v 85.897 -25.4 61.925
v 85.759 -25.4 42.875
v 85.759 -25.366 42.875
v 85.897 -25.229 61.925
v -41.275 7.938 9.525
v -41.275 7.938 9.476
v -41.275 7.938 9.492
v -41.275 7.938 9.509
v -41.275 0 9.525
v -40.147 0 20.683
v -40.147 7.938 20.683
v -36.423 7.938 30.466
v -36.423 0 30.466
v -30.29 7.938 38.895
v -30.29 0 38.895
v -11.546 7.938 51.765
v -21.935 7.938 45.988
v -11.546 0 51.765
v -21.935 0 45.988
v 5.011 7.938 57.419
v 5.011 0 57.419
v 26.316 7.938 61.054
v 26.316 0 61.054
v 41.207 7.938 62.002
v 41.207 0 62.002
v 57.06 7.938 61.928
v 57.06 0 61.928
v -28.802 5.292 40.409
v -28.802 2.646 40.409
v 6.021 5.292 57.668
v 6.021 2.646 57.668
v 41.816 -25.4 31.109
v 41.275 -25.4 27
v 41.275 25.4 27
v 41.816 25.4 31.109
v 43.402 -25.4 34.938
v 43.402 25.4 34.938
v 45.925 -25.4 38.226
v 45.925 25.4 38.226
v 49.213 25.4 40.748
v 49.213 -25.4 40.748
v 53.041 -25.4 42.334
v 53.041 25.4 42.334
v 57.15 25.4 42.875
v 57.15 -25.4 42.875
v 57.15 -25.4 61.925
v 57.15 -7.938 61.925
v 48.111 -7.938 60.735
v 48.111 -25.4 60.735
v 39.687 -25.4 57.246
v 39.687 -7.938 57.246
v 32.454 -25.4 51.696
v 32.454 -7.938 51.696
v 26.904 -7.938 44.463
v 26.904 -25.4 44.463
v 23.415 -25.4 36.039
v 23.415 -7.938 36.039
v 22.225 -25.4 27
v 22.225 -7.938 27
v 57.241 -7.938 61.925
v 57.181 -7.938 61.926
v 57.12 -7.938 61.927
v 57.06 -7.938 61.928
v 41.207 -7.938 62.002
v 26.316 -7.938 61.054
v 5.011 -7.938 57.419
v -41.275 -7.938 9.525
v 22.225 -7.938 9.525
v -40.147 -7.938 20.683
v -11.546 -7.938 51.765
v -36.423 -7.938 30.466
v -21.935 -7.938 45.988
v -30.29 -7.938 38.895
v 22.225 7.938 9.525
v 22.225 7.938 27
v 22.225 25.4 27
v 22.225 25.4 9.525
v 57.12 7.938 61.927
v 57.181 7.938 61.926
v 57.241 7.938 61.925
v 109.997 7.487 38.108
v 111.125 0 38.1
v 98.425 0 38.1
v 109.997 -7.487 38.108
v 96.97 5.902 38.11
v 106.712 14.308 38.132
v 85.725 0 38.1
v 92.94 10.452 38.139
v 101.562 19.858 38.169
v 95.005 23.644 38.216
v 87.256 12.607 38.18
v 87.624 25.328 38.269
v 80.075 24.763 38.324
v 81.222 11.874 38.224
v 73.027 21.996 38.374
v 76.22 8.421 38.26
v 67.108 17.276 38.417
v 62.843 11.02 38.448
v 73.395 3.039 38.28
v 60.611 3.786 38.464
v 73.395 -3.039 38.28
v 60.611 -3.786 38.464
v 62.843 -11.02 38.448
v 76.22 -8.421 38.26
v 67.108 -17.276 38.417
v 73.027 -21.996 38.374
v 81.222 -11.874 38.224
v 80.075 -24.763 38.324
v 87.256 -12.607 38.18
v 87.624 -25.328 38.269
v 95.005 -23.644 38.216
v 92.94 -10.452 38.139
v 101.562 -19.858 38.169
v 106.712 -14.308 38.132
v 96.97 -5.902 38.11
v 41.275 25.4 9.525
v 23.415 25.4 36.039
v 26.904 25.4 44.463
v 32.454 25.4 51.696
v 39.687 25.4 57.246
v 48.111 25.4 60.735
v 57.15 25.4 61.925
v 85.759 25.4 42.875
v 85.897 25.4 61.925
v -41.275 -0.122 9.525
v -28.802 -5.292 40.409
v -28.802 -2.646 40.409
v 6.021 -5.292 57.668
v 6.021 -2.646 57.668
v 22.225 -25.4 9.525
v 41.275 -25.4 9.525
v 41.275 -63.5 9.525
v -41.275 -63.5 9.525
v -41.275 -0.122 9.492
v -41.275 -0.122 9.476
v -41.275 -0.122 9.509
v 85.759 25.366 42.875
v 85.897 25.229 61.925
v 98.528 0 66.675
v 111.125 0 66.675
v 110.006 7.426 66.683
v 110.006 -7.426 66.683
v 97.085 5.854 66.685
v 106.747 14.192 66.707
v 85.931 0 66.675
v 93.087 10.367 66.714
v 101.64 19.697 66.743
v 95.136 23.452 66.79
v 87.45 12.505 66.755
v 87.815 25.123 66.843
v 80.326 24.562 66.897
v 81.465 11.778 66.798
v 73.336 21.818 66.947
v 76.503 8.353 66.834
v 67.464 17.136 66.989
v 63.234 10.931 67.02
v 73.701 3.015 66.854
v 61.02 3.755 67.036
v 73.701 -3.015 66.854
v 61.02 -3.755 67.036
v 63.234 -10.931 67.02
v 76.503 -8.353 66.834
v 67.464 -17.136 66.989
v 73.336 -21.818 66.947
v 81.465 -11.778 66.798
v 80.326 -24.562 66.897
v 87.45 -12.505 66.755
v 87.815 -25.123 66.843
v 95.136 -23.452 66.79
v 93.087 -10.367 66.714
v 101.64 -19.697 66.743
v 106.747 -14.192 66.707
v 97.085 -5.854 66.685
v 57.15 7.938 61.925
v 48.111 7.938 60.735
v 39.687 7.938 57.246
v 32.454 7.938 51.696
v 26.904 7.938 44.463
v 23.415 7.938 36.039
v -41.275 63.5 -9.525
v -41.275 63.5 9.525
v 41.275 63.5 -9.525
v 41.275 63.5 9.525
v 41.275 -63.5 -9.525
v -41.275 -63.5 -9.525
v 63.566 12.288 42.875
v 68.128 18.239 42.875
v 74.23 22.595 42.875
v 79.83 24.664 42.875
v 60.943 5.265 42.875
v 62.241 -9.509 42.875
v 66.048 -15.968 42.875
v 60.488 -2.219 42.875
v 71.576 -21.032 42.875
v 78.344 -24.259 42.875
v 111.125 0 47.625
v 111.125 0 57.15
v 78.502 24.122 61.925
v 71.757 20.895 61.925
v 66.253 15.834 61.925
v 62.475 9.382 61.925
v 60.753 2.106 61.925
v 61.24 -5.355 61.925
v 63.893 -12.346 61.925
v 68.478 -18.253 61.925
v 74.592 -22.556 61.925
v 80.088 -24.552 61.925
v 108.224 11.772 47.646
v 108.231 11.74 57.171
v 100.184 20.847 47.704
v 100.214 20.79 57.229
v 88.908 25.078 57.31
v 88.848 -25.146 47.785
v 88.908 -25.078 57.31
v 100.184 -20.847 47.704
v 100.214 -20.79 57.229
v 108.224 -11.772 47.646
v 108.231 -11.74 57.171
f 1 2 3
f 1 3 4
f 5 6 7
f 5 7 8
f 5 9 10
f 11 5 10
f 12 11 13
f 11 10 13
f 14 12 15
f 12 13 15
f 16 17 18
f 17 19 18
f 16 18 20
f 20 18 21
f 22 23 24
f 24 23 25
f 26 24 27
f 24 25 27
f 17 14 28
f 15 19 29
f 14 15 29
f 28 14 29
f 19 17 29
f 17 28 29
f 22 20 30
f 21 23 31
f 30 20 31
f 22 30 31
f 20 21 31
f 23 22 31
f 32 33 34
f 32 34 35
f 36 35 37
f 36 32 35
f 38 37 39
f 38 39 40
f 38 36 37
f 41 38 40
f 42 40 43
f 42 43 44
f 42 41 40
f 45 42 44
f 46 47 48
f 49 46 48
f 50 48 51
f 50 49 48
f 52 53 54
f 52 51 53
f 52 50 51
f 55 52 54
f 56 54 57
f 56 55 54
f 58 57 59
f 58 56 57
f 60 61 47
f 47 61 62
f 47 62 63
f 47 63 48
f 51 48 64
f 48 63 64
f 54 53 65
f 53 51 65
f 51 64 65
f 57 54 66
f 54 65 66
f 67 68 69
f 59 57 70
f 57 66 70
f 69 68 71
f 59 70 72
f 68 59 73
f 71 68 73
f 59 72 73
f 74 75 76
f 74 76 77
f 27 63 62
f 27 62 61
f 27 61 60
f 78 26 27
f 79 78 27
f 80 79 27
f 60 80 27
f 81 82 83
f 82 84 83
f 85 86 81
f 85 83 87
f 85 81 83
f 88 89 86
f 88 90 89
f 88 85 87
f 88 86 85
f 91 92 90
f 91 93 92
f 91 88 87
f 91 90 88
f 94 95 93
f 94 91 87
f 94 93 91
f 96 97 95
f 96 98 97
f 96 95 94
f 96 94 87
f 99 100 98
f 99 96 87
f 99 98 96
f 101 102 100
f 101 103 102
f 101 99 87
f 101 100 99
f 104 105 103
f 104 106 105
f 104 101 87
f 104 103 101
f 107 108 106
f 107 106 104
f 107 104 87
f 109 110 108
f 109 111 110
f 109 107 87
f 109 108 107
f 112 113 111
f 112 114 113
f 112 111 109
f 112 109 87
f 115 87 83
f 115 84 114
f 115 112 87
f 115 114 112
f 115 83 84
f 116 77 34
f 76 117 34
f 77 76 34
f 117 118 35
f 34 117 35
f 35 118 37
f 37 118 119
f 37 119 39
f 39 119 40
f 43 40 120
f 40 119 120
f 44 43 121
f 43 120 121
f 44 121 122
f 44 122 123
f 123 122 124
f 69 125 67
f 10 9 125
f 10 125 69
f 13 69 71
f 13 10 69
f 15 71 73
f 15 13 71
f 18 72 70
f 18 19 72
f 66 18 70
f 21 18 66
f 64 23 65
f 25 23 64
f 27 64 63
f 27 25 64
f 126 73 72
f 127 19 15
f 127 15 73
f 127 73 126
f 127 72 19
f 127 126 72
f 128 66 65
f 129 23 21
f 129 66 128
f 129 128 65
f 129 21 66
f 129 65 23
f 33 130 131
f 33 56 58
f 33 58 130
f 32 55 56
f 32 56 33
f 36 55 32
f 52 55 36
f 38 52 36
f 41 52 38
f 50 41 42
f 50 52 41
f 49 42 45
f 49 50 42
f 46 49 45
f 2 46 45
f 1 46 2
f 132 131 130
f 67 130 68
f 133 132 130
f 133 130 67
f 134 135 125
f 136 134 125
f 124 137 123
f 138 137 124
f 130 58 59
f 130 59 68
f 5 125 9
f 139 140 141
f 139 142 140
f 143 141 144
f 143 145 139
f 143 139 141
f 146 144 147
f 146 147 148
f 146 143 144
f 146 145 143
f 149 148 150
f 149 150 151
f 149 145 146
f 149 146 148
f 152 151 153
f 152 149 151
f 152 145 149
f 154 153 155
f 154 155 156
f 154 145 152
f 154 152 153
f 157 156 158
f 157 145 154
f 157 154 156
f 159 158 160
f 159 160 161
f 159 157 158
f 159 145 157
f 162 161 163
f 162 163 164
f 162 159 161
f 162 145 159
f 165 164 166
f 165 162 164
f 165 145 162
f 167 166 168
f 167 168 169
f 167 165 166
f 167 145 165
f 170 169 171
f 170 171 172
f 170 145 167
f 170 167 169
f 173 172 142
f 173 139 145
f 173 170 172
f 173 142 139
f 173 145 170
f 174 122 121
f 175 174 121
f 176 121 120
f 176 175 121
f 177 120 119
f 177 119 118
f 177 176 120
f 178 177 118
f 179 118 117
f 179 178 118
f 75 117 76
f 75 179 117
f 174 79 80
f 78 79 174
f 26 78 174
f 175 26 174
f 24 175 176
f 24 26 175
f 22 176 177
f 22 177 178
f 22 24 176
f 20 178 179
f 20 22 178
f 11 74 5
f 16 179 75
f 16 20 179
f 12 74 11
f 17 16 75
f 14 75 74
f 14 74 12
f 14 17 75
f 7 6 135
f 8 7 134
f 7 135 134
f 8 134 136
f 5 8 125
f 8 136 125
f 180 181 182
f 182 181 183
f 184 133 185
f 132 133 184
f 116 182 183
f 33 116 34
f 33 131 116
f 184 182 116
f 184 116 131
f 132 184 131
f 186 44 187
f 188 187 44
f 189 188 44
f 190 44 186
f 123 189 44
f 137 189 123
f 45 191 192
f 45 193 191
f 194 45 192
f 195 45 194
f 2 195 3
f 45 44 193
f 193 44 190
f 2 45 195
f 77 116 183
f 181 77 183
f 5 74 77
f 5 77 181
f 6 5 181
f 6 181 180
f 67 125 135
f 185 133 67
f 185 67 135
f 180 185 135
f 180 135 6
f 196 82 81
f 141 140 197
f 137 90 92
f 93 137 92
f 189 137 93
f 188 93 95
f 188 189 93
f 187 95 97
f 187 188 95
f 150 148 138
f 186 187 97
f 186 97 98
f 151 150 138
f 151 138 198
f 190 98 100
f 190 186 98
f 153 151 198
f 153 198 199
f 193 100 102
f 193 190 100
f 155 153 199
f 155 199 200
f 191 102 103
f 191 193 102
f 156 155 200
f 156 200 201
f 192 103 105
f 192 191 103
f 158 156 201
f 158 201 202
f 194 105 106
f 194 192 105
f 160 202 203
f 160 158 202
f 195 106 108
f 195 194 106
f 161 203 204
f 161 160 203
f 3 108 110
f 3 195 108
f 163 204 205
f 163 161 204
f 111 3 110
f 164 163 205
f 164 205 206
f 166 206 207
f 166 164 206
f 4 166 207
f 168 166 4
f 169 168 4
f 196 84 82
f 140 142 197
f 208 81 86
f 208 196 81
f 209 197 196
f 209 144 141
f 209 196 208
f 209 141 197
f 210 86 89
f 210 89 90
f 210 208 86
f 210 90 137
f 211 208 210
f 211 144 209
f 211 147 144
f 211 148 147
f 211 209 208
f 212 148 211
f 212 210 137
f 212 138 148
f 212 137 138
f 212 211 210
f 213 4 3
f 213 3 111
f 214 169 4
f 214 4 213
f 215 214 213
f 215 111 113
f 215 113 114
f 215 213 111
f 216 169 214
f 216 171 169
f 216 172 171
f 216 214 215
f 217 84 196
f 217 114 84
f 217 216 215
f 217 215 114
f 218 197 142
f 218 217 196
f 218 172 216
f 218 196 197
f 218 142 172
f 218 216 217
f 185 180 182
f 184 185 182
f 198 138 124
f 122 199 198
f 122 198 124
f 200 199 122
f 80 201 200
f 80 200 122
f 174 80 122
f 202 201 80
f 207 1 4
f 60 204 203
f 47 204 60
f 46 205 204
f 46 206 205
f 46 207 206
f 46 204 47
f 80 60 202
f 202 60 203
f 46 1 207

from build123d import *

# Parameters (mm, degrees)
F1_DEPTH    = 63.5
F2_DEPTH    = 25.4
F3_DEPTH    = 7.9375
F5_T1_DEPTH = 7.9375
F5_T3_DEPTH = 7.9375
F5_T8_DEPTH = 8.0594365629


# Not quite as in the source:
# - a fillet or chamfer that OpenCascade refuses, or shapes differently, is made with other operations: its cross-section is extruded or revolved along the edge and cut away or added


with BuildPart() as f1:
    # F0 (on Front) → F1 (new body, symmetric)
    with BuildSketch(Plane.XZ):
        Polygon((-41.275, 9.525), (-41.275, -9.525), (41.275, -9.525), (41.275, 9.525), (22.2249999642, 9.525), align=None)
    extrude(amount=F1_DEPTH, both=True)

    # F0 (on Front) → F2 (join, symmetric)
    with BuildSketch(Plane.XZ):
        with BuildLine():
            Line((22.2249999642, 9.525), (41.275, 9.525))
            Line((41.275, 9.525), (41.275, 27.0002))
            ThreePointArc((41.275, 27.0002), (45.9246798487, 38.2255201513), (57.15, 42.8752))
            Line((57.15, 42.8752), (60.325, 42.8752))
            Line((60.325, 42.8752), (60.325, 61.9252000358))
            Line((60.325, 61.9252000358), (57.15, 61.9252000358))
            ThreePointArc((57.15, 61.9252000358), (32.4542956418, 51.6959043582), (22.2249999642, 27.0002))
            Line((22.2249999642, 27.0002), (22.2249999642, 9.525))
        make_face()
        Polygon((85.8965185289, 61.9252000358), (60.325, 61.9252000358), (60.325, 42.8752), (85.759376848, 42.8752), align=None)
    extrude(amount=F2_DEPTH, both=True)

    # F0 (on Front) → F3 (join, symmetric)
    with BuildSketch(Plane.XZ):
        with BuildLine():
            add(Edge.make_bspline(
                [(-41.275, 9.525), (-42.0210659504, 47.4507585168), (0, 63.975892961), (57.15, 61.9252000358)],
                knots=[0, 0, 0, 0, 111.5045361803, 111.5045361803, 111.5045361803, 111.5045361803], degree=3))
            Line((-41.275, 9.525), (22.2249999642, 9.525))
            Line((22.2249999642, 9.525), (22.2249999642, 27.0002))
            ThreePointArc((22.2249999642, 27.0002), (32.4542956418, 51.6959043582), (57.15, 61.9252000358))
        make_face()
    extrude(amount=F3_DEPTH, both=True)

    # F0 (on Front) → F4 (revolve)
    with BuildSketch(Plane.XZ):
        Polygon((85.9307125211, 66.675), (85.8965185289, 61.9252000358), (85.759376848, 42.8752), (85.725, 38.1), (111.125, 38.1), (111.125, 66.675), align=None)
    revolve(axis=Axis((85.8278562605, 0, 52.3875), (0.0071988518, 0, 0.9999740879)))

    # F5: fillet of radius 5.08 on 6 edges, made by hand

    # F5_s2 → F5_t1 (join)
    with BuildSketch(Plane.XZ):
        with BuildLine():
            ThreePointArc((57.0602012116, 61.9284074084), (57.1504319335, 61.9260019422), (57.2406911513, 61.9252000358))
            Line((57.2406911513, 61.9252000358), (57.2406911513, 61.8236000358))
            Line((57.2406911513, 61.8236000358), (57.15, 61.8236000358))
            Line((57.15, 61.8236000358), (57.1463566684, 61.8236653809))
            ThreePointArc((57.1463566684, 61.8236653809), (57.1014741691, 61.8252721742), (57.0565914128, 61.8268715558))
            Line((57.0565914128, 61.8268715558), (57.0602012116, 61.9284074084))
        make_face()
    extrude(amount=F5_T1_DEPTH)

    # F5_s4 → F5_t3 (join)
    with BuildSketch(Plane.XZ.offset(-7.9375)):
        with BuildLine():
            ThreePointArc((57.0602012116, 61.9284074084), (57.1504319335, 61.9260019422), (57.2406911513, 61.9252000358))
            Line((57.2406911513, 61.9252000358), (57.2406911513, 61.8236000358))
            Line((57.2406911513, 61.8236000358), (57.15, 61.8236000358))
            Line((57.15, 61.8236000358), (57.1463566684, 61.8236653809))
            ThreePointArc((57.1463566684, 61.8236653809), (57.1014741691, 61.8252721742), (57.0565914128, 61.8268715558))
            Line((57.0565914128, 61.8268715558), (57.0602012116, 61.9284074084))
        make_face()
    extrude(amount=F5_T3_DEPTH)


with BuildPart() as f5_tool6:
    # F5_s7 → F5_t8 (new body)
    with BuildSketch(Plane.XZ.offset(0.1219365629)):
        with BuildLine():
            ThreePointArc((-41.275, 9.4762253748), (-41.2752233916, 9.5238657859), (-41.2758935468, 9.5715020071))
            Line((-41.2758935468, 9.5715020071), (-41.1743114177, 9.5734075397))
            ThreePointArc((-41.1743114177, 9.5734075397), (-41.1738708312, 9.5502028132), (-41.1734196528, 9.526998263))
            Line((-41.1734196528, 9.526998263), (-41.1734, 9.525))
            Line((-41.1734, 9.525), (-41.1734, 9.4762253748))
            Line((-41.1734, 9.4762253748), (-41.275, 9.4762253748))
        make_face()
    extrude(amount=-F5_T8_DEPTH)

    split(bisect_by=Plane.XY.offset(9.525), keep=Keep.BOTTOM)


with BuildPart() as f1_1:
    add(f1.part)

    # F5_t5: union F5_tool6
    add(f5_tool6.part)


solid = f1_1.part
